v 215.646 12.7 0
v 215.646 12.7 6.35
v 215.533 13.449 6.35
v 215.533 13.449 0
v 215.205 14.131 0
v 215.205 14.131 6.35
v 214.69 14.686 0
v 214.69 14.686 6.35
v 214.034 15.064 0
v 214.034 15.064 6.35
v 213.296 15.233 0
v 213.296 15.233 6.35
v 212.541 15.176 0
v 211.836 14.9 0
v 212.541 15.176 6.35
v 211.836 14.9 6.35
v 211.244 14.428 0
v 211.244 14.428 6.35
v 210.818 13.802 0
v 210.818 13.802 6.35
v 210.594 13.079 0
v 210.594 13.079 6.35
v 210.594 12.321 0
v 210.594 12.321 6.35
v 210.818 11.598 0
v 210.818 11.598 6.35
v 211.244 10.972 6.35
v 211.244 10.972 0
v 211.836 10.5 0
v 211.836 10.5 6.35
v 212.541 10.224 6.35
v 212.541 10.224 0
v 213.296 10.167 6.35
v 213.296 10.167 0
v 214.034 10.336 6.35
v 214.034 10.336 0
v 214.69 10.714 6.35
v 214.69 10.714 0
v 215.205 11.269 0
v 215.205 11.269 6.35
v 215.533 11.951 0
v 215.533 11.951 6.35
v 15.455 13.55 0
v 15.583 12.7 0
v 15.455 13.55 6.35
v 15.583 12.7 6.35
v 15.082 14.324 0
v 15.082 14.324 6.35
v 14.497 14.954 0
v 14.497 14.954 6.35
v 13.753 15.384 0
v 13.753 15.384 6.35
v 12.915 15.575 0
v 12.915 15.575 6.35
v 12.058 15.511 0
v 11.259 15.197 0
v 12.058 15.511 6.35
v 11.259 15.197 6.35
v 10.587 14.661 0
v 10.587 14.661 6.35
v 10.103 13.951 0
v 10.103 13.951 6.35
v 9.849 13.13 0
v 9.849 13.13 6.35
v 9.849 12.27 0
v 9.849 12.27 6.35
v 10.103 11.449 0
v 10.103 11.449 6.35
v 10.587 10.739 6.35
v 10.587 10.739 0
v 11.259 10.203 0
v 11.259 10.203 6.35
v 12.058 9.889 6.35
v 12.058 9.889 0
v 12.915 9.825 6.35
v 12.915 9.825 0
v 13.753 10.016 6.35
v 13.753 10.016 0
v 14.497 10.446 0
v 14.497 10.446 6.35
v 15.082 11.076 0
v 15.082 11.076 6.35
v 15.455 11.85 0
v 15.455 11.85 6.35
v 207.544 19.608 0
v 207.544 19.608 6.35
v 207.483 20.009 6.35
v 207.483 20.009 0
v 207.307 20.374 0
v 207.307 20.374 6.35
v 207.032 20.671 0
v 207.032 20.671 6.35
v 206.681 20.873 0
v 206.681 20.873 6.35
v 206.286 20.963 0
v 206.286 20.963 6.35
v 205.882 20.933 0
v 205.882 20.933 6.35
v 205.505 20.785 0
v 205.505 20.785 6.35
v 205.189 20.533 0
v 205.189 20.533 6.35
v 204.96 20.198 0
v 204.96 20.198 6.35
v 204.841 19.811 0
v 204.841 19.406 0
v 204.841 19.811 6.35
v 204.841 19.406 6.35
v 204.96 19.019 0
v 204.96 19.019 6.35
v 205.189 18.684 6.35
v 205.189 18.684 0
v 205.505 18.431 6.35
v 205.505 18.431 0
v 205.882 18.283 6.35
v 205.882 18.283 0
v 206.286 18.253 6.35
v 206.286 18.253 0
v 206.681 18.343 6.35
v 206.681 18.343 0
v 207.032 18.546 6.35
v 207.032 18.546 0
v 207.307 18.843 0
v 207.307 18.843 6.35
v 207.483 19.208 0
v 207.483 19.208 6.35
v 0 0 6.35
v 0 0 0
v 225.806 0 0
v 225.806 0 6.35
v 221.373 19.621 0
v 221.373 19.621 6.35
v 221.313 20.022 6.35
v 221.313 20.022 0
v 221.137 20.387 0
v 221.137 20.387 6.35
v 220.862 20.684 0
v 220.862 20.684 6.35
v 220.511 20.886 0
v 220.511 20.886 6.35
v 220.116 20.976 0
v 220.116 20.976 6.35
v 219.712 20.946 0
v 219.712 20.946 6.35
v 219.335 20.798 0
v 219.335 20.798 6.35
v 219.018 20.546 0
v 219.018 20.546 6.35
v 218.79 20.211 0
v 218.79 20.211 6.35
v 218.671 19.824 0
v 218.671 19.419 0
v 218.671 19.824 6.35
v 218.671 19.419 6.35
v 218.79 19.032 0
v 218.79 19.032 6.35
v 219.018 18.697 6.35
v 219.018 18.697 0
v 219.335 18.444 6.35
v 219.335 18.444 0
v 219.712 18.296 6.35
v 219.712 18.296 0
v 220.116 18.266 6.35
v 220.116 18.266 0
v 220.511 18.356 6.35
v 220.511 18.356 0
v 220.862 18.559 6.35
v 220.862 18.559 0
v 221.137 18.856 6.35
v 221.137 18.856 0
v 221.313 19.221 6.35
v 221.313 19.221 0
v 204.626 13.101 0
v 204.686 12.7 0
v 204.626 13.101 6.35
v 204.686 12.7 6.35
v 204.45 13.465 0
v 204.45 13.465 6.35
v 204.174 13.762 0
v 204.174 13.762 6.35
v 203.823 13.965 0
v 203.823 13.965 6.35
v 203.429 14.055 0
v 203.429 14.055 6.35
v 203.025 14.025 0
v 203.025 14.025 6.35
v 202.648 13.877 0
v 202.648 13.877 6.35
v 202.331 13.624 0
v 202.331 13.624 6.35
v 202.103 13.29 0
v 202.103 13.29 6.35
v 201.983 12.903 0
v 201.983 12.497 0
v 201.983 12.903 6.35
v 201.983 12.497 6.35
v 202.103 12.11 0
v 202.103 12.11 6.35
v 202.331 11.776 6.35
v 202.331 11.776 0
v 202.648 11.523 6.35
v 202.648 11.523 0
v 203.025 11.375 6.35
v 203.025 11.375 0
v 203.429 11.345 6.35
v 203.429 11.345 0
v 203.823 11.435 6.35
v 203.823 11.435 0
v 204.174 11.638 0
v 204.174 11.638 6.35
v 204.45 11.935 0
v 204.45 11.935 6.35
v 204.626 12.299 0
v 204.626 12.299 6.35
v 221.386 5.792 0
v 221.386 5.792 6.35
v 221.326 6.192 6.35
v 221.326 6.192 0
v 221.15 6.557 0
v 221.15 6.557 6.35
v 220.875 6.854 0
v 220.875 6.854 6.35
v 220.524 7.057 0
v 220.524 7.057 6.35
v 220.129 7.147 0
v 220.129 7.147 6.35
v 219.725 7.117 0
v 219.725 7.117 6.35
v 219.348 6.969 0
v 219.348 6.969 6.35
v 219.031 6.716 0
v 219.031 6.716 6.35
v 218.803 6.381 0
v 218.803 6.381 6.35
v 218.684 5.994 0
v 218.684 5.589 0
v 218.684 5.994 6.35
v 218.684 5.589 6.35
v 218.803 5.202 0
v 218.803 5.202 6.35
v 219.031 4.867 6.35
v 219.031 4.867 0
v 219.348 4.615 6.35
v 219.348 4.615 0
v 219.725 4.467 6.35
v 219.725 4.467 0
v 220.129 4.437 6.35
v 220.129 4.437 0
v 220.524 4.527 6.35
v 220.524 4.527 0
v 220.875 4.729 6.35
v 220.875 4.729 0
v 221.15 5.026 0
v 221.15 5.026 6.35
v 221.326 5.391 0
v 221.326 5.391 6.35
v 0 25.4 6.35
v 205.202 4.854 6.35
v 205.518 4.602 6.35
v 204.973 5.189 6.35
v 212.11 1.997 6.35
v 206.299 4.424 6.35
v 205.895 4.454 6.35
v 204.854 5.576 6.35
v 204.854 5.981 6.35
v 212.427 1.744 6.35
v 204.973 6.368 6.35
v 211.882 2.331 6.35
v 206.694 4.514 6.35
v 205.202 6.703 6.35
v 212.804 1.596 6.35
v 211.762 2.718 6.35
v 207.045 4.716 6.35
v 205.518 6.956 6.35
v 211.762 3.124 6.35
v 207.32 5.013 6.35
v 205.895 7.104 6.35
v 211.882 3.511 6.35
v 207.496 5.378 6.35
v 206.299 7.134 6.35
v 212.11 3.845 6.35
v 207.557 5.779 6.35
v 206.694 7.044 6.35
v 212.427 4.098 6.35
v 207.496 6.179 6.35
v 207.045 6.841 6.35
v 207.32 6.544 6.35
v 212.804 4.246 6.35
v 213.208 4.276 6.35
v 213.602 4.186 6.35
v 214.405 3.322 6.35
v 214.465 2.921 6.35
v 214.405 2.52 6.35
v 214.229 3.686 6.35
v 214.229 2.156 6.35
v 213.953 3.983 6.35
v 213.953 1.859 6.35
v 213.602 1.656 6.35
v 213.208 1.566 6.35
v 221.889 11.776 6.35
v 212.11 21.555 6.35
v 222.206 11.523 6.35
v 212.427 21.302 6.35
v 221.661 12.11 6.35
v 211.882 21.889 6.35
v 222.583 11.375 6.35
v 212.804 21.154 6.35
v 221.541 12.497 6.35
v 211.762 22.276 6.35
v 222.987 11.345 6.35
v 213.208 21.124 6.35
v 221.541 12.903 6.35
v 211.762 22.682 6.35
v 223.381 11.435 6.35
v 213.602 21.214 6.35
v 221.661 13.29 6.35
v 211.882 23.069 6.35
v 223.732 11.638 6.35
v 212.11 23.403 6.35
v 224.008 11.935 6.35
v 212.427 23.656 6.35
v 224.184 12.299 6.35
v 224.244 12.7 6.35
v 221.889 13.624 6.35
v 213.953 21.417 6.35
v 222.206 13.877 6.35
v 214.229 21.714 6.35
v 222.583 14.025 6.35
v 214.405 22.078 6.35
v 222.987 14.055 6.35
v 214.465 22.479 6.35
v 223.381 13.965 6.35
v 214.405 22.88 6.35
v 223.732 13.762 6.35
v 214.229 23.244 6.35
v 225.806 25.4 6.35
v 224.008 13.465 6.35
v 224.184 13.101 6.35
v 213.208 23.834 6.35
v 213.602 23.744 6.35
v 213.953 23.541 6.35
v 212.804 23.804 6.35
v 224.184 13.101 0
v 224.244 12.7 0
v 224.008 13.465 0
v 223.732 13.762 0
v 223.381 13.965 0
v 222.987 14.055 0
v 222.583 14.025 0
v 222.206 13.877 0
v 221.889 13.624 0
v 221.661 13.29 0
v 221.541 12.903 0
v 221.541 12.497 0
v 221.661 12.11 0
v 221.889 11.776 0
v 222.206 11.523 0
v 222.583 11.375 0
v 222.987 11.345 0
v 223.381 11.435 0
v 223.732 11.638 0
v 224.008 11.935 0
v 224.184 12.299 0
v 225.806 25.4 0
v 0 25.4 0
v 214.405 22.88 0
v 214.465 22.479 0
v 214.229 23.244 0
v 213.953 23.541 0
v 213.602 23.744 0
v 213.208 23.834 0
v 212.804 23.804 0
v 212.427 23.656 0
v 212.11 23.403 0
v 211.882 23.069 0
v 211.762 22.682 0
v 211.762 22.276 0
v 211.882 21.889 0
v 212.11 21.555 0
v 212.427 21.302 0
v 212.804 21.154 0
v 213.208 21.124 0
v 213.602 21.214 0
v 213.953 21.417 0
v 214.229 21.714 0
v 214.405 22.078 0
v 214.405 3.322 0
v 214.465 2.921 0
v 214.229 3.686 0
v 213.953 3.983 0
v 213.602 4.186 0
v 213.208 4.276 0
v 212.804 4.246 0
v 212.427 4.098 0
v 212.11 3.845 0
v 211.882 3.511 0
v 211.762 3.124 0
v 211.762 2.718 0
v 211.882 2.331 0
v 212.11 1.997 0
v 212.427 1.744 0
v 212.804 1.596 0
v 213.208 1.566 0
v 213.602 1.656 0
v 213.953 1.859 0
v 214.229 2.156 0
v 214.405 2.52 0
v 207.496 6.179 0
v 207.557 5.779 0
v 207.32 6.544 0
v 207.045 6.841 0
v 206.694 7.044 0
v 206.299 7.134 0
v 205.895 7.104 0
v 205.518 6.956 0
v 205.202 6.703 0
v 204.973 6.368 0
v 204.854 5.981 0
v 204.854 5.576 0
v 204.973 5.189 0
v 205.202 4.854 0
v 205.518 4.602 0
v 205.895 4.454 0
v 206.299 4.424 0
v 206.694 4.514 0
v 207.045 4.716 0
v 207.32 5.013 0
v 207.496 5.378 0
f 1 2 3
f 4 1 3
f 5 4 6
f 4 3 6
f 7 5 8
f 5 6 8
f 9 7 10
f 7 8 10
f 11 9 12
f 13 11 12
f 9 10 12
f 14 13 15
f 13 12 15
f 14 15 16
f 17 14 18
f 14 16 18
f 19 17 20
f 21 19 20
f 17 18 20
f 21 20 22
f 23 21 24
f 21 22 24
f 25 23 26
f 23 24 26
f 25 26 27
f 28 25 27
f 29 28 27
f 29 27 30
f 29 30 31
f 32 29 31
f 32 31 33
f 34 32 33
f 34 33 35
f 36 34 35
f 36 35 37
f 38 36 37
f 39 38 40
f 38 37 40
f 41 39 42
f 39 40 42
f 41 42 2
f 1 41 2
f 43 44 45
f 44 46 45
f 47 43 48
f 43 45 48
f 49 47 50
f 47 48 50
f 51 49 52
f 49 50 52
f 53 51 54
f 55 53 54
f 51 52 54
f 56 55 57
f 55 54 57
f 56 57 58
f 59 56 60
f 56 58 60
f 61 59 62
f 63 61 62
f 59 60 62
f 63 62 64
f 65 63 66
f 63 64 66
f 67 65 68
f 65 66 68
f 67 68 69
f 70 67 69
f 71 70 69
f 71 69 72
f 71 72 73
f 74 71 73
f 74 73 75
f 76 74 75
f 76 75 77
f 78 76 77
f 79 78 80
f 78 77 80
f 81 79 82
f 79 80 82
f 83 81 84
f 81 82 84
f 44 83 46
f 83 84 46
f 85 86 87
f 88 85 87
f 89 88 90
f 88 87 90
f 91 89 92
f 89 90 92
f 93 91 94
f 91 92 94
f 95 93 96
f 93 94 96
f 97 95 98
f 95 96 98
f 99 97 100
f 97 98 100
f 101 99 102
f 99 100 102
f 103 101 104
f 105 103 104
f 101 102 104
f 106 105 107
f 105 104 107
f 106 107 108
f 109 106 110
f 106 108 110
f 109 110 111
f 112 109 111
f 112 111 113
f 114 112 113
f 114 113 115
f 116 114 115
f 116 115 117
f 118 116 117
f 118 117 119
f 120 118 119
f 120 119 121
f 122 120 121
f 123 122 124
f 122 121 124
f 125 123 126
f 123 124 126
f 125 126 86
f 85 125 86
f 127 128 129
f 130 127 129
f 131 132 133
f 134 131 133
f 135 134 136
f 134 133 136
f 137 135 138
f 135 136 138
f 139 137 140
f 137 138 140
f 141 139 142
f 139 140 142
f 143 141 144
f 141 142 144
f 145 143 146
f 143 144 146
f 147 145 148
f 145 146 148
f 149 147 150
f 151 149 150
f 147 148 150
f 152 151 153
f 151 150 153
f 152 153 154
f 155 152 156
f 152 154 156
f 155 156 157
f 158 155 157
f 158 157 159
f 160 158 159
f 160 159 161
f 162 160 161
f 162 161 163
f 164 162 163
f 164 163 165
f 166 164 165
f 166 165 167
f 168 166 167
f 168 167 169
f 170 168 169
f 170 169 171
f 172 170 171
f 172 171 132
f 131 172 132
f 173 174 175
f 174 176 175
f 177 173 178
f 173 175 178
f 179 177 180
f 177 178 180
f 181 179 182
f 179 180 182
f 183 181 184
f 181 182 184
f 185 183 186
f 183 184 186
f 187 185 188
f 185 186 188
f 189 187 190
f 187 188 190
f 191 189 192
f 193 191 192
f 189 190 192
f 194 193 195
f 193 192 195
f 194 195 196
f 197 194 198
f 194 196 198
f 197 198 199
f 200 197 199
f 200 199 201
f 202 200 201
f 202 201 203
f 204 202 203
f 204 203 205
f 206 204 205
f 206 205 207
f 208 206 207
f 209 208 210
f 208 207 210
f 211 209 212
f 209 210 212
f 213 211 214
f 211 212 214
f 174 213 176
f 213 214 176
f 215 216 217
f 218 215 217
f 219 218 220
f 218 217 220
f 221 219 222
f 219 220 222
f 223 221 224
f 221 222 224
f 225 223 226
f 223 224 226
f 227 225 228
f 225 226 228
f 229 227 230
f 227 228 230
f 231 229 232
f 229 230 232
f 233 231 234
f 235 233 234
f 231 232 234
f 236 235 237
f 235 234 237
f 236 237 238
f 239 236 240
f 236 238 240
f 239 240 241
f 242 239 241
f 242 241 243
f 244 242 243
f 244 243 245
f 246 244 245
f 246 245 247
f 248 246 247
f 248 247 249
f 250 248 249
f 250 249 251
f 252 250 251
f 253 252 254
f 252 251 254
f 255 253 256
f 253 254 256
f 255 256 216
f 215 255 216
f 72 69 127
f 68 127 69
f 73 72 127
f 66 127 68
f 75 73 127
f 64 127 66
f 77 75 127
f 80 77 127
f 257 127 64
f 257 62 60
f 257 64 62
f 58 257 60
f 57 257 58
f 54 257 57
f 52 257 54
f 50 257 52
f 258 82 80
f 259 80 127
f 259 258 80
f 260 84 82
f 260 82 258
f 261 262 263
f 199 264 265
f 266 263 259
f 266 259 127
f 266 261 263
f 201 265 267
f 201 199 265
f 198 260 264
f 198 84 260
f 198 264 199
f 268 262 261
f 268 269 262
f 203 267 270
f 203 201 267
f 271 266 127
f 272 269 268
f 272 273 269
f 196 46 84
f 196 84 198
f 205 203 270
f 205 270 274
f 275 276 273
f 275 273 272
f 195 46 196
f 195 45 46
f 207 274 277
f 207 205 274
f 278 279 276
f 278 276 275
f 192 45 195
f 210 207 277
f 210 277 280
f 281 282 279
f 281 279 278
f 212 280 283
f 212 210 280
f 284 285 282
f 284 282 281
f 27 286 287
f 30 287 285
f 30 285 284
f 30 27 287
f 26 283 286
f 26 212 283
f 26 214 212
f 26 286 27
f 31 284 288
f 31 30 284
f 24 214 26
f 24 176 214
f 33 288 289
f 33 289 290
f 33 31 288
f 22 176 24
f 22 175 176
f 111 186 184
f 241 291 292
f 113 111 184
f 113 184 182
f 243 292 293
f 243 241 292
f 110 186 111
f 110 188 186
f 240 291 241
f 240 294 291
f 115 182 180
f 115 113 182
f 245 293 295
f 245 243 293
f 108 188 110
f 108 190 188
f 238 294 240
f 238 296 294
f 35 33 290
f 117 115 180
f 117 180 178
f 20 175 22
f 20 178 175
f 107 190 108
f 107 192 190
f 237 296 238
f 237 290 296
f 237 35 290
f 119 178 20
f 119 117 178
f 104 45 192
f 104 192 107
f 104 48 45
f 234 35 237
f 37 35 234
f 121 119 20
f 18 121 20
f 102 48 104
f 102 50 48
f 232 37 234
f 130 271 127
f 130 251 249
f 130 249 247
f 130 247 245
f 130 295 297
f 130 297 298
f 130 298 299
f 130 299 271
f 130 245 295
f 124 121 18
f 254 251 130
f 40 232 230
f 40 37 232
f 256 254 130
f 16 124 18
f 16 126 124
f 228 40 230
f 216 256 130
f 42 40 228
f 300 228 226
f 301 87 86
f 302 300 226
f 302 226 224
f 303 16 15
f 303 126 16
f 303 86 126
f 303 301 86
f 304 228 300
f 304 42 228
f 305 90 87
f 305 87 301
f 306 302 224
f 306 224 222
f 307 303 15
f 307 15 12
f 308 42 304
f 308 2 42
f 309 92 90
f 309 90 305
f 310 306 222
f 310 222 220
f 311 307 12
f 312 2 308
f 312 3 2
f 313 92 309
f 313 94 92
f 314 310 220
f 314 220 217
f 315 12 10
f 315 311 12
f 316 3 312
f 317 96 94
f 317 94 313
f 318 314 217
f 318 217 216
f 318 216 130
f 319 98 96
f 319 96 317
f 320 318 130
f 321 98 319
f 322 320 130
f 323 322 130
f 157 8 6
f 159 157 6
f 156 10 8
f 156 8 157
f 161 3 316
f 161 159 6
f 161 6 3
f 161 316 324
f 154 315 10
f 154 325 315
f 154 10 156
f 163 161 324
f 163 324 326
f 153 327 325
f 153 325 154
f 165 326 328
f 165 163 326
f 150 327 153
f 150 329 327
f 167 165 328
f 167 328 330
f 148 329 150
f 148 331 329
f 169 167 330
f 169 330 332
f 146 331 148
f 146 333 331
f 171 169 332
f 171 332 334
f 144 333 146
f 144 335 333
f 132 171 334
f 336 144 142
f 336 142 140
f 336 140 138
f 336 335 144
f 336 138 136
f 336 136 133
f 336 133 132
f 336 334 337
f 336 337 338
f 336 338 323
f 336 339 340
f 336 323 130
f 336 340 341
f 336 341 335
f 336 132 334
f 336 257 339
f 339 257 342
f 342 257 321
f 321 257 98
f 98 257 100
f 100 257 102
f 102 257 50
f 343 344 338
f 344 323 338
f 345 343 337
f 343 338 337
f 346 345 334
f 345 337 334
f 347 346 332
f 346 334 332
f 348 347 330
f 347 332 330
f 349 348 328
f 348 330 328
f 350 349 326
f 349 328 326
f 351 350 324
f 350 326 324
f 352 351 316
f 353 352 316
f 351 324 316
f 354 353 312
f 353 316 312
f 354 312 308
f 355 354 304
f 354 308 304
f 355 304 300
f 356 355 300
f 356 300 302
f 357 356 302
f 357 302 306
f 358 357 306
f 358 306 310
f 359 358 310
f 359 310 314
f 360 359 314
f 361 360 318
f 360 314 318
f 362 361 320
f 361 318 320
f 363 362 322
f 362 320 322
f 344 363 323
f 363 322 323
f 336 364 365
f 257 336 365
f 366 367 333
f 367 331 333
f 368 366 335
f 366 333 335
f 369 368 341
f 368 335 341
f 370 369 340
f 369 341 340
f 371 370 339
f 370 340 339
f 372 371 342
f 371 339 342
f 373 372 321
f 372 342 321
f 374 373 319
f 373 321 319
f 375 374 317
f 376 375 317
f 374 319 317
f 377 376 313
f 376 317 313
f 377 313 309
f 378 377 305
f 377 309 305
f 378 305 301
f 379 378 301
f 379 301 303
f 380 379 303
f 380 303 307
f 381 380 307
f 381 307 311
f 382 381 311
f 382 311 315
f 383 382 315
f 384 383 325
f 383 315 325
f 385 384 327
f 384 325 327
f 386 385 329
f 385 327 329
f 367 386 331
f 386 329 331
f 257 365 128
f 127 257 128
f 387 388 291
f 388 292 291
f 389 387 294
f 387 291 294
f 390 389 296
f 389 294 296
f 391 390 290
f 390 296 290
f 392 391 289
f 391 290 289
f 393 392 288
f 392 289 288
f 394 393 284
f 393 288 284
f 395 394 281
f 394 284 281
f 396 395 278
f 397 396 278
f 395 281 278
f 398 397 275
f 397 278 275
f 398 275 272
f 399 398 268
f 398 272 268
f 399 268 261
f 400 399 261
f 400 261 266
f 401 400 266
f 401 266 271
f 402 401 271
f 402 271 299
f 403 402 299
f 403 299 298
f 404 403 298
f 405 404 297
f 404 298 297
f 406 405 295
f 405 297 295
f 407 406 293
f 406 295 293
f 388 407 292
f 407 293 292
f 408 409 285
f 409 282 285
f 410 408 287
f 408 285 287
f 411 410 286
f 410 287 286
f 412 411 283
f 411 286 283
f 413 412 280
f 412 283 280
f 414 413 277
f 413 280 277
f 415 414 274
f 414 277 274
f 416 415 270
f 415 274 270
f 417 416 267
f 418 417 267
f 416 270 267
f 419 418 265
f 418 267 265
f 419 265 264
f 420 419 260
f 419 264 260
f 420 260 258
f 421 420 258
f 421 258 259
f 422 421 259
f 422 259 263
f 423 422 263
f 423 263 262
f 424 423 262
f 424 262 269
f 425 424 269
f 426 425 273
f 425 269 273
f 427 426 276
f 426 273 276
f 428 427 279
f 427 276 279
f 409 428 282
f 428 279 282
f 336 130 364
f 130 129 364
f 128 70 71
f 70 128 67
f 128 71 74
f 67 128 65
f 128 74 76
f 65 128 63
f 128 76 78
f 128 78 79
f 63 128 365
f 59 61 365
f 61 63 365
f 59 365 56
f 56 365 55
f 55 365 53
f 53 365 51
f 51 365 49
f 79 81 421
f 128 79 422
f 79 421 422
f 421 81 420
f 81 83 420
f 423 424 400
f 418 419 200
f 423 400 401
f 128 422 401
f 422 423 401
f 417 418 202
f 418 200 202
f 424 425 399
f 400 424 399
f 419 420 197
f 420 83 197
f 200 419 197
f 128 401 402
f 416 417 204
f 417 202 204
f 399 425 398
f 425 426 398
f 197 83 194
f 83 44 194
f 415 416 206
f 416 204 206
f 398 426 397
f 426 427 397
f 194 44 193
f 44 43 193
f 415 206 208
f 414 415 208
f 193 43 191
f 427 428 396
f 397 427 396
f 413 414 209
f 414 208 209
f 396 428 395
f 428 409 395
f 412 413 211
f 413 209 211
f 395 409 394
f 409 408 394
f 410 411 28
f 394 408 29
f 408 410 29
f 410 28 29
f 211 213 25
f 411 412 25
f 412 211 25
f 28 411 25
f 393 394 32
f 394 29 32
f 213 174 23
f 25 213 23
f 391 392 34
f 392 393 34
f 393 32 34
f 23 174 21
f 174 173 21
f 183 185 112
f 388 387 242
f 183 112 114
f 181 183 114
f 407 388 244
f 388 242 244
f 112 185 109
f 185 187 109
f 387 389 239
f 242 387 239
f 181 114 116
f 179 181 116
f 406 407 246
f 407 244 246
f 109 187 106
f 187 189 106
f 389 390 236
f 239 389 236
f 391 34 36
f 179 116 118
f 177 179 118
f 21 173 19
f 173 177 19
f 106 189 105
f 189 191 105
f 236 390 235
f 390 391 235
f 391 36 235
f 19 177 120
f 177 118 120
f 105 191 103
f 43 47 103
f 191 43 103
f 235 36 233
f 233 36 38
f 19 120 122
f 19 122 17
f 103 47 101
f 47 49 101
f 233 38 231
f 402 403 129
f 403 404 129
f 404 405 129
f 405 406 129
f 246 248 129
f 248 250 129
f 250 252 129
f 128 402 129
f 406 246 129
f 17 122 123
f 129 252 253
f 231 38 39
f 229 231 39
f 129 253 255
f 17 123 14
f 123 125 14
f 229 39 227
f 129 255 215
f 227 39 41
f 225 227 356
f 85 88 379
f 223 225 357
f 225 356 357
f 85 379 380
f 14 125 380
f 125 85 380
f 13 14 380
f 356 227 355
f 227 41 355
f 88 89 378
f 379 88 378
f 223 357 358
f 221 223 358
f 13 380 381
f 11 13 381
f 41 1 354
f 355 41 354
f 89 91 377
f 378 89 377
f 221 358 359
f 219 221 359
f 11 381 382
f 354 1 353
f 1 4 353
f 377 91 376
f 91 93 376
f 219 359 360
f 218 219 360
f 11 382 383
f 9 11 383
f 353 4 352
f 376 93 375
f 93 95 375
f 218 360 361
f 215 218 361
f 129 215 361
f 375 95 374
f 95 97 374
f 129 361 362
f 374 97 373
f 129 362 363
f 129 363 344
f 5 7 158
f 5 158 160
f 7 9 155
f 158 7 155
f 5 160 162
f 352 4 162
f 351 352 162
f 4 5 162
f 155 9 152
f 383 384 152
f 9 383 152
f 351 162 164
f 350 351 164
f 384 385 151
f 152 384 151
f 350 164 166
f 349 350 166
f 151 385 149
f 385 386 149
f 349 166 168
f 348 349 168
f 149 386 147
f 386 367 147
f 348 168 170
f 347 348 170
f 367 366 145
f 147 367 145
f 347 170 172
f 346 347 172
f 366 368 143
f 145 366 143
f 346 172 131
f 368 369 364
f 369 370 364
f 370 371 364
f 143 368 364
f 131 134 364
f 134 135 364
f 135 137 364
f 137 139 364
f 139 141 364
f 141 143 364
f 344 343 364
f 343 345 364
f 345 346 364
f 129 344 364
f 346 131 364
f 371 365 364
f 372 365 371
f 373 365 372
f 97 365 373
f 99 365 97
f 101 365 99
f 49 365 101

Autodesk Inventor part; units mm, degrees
ref_plane "YZ Plane" through (0, 0, 0) normal (1, 0, 0) x (0, 1, 0)
ref_plane "XZ Plane" through (0, 0, 0) normal (0, 1, 0) x (-1, 0, 0)
ref_plane "XY Plane" through (0, 0, 0) normal (0, 0, 1) x (1, 0, 0)
sketch "Sketch1" plane through (0, 0, 0) normal (0, 0, 1) x (1, 0, 0)
  line L0 (0, 0) -> (225.806, 0)
  line L1 (225.806, 0) -> (225.806, 25.4)
  line L2 (225.806, 25.4) -> (0, 25.4)
  line L3 (0, 25.4) -> (0, 0)
  dimension "d0" = 225.806
  dimension "d1" = 25.4
extrude "Extrusion1" add sketch "Sketch1" along normal blind 6.35
sketch "Sketch2" plane through (0, 0, 6.35) normal (0, 0, 1) x (1, 0, 0)
  line L0 (0, 25.4) -> (0, 0) projected
  line L1 (0, 0) -> (225.806, 0) projected
  line L2 (225.806, 25.4) -> (0, 25.4) projected
  circle A0 centre (12.7, 12.7) radius 2.8829
  dimension "d4" = 12.7
  dimension "d5" = 25.4
  dimension "d6" = 5.7658
  dimension "d15" = 12.7
extrude "Extrusion2" cut sketch "Sketch2" against normal through all
sketch "Sketch3" plane through (0, 0, 6.35) normal (0, 0, 1) x (1, 0, 0)
  line L0 (0, 0) -> (225.806, 0) projected
  line L1 (225.806, 25.4) -> (0, 25.4) projected
  line L2 (225.806, 0) -> (225.806, 25.4) projected
  circle A0 centre (213.106, 12.7) radius 2.54
  dimension "d9" = 25.4
  dimension "d10" = 12.7
  dimension "d11" = 12.7
  dimension "d12" = 5.08
extrude "Extrusion3" cut sketch "Sketch3" against normal through all
sketch "Sketch4" plane through (0, 0, 6.35) normal (0, 0, 1) x (1, 0, 0)
  circle A0 centre (213.106, 12.7) radius 2.54 projected
  circle A1 centre (213.106, 12.7) radius 9.779
  line L0 (213.106, 22.479) -> (206.1847, 19.6083)
  line L1 (206.1847, 19.6083) -> (203.327, 12.7)
  line L2 (203.327, 12.7) -> (206.1977, 5.7787)
  line L3 (206.1977, 5.7787) -> (213.106, 2.921)
  line L4 (213.106, 2.921) -> (220.0273, 5.7917)
  line L5 (220.0273, 5.7917) -> (222.885, 12.7)
  line L6 (222.885, 12.7) -> (220.0143, 19.6213)
  line L7 (220.0143, 19.6213) -> (213.106, 22.479)
  circle A2 centre (213.106, 22.479) radius 1.3589
  circle A3 centre (220.0143, 19.6213) radius 1.3589
  circle A4 centre (222.885, 12.7) radius 1.3589
  circle A5 centre (220.0273, 5.7917) radius 1.3589
  circle A6 centre (213.106, 2.921) radius 1.3589
  circle A7 centre (206.1977, 5.7787) radius 1.3589
  circle A8 centre (203.327, 12.7) radius 1.3589
  circle A9 centre (206.1847, 19.6083) radius 1.3589
  point P0 (0, 0)
  dimension "d16" = 19.558
  dimension "d17" = 7.493
  dimension "d18" = 2.7178
  dimension "d19" = 2.7178
  dimension "d20" = 2.7178
  dimension "d21" = 2.7178
  dimension "d22" = 2.7178
  dimension "d23" = 2.7178
  dimension "d24" = 2.7178
  dimension "d25" = 2.7178
extrude "Extrusion4" cut sketch "Sketch4" against normal through all contours L6 A4 A1 | A1 A4 | A1 A4 L5 | L5 A4 L6 | A3 L6 A1 | A1 A3 | A5 A1 | A1 L5 A5 | L5 L4 A5 | A3 L7 L6 | L7 A3 A1 | A1 A5 L4 | A6 A1 L4 | L4 L3 A6 | A2 L0 L7 | L7 A1 A2 | A1 A2 | A6 A1 | A1 A6 L3 | L0 A2 A1 | A7 A1 L3 | L3 L2 A7 | A9 L1 L0 | L0 A1 A9 | A7 A1 | A1 A7 L2 | A1 A9 | L1 A9 A1 | A8 A1 | A1 L2 A8 | L2 L1 A8 | A8 L1 A1
equation "\"d4\" = 0.5 * d5"
equation "\"d15\" = 0.5 * d5"
equation "\"d10\" = 0.5 * d9"
equation "\"d11\" = 0.5 * d9"
equation "\"d19\" = d18"
equation "\"d20\" = d18"
equation "\"d21\" = d18"
equation "\"d22\" = d18"
equation "\"d23\" = d18"
equation "\"d24\" = d18"
equation "\"d25\" = d18"
properties part number "bar arms"
